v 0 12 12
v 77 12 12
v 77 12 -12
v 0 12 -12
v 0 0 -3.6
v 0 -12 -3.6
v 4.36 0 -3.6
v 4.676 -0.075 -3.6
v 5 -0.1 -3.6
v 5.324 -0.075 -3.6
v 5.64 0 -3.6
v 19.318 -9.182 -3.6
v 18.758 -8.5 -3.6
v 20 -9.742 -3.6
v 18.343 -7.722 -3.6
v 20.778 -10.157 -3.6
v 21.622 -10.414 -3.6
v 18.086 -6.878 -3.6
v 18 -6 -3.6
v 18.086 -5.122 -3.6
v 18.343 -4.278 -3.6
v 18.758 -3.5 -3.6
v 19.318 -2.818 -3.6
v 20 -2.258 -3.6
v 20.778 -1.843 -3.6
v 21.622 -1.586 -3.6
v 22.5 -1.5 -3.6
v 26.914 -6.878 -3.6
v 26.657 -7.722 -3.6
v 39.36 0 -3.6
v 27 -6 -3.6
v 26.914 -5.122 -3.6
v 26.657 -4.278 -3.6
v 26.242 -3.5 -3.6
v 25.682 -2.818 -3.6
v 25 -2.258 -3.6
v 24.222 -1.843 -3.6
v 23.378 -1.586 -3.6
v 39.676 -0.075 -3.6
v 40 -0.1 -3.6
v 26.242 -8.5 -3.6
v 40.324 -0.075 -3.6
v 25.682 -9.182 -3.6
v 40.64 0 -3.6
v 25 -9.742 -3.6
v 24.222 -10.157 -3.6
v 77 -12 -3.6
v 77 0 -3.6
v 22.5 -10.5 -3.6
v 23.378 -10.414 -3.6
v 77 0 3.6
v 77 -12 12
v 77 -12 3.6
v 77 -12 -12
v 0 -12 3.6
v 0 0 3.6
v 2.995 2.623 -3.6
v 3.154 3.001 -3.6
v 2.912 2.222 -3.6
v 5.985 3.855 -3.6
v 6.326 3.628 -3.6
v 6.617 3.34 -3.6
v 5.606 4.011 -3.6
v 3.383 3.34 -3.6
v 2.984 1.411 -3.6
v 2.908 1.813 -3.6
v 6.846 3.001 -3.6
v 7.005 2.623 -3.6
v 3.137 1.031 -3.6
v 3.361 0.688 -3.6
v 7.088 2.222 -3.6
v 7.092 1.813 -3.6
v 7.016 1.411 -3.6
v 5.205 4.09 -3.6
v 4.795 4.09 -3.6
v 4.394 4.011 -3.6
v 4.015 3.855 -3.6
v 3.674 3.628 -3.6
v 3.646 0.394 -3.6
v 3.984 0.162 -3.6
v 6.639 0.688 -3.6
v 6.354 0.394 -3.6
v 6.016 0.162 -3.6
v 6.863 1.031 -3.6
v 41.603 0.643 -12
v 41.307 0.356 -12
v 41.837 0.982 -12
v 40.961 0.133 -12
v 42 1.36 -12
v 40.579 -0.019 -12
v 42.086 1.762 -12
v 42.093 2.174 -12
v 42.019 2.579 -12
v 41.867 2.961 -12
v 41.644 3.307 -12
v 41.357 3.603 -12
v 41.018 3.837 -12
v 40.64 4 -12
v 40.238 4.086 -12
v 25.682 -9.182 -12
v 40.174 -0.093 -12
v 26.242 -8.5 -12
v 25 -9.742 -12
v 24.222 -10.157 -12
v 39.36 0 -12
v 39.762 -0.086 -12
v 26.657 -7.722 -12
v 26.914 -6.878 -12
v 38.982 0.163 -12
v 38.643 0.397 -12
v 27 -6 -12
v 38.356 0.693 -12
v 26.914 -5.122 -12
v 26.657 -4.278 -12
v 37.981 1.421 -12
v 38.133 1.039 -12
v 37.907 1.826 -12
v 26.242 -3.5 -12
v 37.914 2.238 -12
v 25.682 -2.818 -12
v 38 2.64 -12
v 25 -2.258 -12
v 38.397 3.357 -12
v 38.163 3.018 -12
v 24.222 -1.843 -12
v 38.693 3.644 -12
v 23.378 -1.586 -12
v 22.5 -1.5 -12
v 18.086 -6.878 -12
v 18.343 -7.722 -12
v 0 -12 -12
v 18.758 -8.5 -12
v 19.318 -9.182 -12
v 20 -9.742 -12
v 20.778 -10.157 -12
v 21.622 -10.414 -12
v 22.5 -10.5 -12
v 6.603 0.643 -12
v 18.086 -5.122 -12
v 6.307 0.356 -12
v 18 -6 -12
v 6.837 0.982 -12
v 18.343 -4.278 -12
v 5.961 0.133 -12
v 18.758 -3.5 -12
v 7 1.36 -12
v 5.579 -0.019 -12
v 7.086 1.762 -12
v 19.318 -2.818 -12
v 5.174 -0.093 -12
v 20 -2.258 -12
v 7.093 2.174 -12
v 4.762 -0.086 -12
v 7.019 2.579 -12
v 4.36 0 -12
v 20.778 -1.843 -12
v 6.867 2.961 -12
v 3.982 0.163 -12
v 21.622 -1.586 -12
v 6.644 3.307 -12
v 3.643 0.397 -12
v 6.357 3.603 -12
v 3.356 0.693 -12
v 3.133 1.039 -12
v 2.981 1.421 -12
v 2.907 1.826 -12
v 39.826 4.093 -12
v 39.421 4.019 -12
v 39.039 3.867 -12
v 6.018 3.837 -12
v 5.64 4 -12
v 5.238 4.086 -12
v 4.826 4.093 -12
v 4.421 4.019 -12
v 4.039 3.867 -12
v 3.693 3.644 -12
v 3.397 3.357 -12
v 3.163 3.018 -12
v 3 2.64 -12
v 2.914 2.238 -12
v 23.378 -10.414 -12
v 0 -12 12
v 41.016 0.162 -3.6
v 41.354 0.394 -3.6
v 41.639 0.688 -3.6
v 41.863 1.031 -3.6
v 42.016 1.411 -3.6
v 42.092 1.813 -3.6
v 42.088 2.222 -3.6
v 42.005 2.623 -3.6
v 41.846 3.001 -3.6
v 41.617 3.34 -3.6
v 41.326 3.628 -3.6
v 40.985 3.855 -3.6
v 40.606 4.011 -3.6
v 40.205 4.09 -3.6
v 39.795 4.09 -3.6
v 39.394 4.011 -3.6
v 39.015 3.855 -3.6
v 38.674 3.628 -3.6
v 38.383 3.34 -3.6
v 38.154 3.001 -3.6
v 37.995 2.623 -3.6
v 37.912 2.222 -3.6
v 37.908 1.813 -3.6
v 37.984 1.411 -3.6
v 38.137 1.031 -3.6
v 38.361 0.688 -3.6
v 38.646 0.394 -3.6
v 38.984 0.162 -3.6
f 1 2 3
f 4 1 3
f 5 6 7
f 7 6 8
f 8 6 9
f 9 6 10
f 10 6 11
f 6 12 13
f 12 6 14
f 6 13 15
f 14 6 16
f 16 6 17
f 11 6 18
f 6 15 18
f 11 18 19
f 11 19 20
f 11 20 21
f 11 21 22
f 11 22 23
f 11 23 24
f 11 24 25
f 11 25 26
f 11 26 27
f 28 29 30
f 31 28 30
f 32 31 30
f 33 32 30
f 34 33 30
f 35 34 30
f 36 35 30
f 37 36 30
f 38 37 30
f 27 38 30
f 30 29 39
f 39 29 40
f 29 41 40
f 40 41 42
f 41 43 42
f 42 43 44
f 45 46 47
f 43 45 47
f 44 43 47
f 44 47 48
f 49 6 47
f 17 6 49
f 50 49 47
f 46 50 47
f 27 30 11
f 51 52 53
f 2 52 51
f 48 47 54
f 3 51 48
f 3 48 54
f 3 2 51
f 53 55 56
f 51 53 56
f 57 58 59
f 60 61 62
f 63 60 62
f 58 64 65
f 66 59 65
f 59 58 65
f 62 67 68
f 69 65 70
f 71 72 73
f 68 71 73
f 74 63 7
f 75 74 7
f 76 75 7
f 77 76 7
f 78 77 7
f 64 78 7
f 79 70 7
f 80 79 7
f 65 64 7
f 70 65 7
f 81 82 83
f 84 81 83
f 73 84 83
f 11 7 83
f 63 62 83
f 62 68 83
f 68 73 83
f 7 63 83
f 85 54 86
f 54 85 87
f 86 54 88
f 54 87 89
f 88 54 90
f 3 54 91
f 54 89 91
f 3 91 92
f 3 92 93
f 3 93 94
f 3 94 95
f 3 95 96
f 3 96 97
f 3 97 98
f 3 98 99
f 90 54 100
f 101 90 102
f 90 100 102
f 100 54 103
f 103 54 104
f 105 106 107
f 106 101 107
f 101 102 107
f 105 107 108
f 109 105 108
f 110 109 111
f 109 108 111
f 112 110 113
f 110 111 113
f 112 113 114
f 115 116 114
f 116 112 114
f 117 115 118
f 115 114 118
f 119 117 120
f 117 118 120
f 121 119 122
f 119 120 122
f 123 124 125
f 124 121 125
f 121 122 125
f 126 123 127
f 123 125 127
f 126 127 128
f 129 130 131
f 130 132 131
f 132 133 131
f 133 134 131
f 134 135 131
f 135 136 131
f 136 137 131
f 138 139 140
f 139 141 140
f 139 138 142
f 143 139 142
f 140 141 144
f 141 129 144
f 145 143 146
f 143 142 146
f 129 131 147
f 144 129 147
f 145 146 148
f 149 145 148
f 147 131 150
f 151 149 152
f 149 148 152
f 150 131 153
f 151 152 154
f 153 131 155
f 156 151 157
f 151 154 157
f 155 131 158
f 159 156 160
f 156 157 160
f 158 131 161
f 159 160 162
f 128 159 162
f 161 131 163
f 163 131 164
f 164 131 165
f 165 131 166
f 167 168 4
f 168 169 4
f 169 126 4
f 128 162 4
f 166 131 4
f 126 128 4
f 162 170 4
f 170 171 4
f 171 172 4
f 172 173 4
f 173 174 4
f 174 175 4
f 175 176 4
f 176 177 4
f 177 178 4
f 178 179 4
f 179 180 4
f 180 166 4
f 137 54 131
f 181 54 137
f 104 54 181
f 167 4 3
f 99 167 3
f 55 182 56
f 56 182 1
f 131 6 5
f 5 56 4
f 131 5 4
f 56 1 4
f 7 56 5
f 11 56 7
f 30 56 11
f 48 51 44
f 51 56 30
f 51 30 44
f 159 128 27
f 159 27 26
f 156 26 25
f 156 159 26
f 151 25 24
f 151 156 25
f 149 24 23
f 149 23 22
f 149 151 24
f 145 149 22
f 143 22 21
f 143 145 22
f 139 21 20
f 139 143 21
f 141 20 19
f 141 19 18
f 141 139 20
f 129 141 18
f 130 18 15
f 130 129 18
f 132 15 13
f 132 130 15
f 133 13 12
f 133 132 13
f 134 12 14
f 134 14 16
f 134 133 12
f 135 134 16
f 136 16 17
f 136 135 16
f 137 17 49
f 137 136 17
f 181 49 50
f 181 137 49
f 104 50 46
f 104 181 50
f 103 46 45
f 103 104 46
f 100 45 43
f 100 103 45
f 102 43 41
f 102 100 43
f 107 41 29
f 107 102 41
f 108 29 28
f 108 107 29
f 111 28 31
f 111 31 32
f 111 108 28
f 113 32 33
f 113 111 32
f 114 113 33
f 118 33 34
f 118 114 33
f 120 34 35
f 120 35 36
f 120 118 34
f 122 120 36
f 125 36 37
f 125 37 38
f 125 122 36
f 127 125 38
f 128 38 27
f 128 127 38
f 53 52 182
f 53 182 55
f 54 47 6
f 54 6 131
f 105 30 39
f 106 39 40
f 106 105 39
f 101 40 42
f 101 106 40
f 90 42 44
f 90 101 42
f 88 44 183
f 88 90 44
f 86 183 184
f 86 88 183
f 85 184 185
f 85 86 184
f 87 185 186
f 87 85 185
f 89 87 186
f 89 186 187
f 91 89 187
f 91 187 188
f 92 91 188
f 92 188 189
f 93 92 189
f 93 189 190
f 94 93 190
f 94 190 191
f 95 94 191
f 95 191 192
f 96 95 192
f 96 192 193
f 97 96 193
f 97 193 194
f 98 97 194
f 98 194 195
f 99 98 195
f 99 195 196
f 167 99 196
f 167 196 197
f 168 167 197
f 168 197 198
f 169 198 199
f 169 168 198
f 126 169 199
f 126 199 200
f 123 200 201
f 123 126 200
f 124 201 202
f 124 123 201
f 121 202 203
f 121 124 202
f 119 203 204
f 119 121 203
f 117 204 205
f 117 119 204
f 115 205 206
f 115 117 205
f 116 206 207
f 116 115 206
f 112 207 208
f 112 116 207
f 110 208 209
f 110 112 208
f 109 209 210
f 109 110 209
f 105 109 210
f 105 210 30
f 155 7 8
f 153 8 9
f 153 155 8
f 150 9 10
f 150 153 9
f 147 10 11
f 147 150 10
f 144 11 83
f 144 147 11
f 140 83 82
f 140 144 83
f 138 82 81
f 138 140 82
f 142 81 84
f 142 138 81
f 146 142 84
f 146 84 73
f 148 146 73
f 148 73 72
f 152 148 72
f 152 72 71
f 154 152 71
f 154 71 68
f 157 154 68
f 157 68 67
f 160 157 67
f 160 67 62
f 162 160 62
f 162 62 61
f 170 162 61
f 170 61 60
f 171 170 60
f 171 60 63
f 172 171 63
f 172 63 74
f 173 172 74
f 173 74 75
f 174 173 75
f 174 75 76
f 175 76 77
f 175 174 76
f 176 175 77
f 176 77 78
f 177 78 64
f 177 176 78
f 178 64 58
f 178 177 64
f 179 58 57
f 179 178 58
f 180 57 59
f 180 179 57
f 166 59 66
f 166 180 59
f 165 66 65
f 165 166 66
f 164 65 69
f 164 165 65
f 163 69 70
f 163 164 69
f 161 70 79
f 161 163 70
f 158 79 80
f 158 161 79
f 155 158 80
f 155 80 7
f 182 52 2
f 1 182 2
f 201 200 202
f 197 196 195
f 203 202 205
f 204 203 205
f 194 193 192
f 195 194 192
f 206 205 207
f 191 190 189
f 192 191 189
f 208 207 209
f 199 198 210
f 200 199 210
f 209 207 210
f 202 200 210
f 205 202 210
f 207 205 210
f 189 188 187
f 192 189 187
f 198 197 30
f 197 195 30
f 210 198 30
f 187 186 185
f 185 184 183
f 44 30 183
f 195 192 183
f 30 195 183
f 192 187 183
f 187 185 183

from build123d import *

# Parameters (mm, degrees)
SKETCH2_W           = 24
SKETCH2_H           = 24
BOSS_EXTRUDE1_DEPTH = 77
SKETCH3_W           = 3.6
SKETCH3_H           = 12
CUT_EXTRUDE3_DEPTH  = 77
SKETCH4_R           = 2.1
SKETCH4_R_2         = 4.5
CUT_EXTRUDE4_DEPTH  = 8.4


with BuildPart() as part:
    # Sketch2 → Boss-Extrude1 (new body)
    with BuildSketch(Plane(origin=(0, 0, 0), x_dir=(0, 0, -1), z_dir=(1, 0, 0))):
        Rectangle(SKETCH2_W, SKETCH2_H)
    extrude(amount=BOSS_EXTRUDE1_DEPTH)

    # Sketch3 → Cut-Extrude3 (cut)
    with BuildSketch(Plane(origin=(77, 0, 0), x_dir=(0, 0, -1), z_dir=(1, 0, 0))):
        with Locations((1.8, -6)):
            Rectangle(SKETCH3_W, SKETCH3_H)
    cut_extrude3 = extrude(amount=-CUT_EXTRUDE3_DEPTH, mode=Mode.SUBTRACT)

    # Mirror1: Cut-Extrude3 across plane
    add(cut_extrude3.mirror(Plane.XY), mode=Mode.SUBTRACT)

    # Sketch4 → Cut-Extrude4 (cut)
    with BuildSketch(Plane.XY.offset(-12)):
        with Locations(Location((40, 2, 0), (0, 0, 252.247209838))):
            Circle(SKETCH4_R)
        with Locations(Location((22.5, -6, 0), (0, 0, 90))):
            Circle(SKETCH4_R_2)
        with Locations(Location((5, 2, 0), (0, 0, 252.247209838))):
            Circle(SKETCH4_R)
    extrude(amount=CUT_EXTRUDE4_DEPTH, mode=Mode.SUBTRACT)


solid = part.part
